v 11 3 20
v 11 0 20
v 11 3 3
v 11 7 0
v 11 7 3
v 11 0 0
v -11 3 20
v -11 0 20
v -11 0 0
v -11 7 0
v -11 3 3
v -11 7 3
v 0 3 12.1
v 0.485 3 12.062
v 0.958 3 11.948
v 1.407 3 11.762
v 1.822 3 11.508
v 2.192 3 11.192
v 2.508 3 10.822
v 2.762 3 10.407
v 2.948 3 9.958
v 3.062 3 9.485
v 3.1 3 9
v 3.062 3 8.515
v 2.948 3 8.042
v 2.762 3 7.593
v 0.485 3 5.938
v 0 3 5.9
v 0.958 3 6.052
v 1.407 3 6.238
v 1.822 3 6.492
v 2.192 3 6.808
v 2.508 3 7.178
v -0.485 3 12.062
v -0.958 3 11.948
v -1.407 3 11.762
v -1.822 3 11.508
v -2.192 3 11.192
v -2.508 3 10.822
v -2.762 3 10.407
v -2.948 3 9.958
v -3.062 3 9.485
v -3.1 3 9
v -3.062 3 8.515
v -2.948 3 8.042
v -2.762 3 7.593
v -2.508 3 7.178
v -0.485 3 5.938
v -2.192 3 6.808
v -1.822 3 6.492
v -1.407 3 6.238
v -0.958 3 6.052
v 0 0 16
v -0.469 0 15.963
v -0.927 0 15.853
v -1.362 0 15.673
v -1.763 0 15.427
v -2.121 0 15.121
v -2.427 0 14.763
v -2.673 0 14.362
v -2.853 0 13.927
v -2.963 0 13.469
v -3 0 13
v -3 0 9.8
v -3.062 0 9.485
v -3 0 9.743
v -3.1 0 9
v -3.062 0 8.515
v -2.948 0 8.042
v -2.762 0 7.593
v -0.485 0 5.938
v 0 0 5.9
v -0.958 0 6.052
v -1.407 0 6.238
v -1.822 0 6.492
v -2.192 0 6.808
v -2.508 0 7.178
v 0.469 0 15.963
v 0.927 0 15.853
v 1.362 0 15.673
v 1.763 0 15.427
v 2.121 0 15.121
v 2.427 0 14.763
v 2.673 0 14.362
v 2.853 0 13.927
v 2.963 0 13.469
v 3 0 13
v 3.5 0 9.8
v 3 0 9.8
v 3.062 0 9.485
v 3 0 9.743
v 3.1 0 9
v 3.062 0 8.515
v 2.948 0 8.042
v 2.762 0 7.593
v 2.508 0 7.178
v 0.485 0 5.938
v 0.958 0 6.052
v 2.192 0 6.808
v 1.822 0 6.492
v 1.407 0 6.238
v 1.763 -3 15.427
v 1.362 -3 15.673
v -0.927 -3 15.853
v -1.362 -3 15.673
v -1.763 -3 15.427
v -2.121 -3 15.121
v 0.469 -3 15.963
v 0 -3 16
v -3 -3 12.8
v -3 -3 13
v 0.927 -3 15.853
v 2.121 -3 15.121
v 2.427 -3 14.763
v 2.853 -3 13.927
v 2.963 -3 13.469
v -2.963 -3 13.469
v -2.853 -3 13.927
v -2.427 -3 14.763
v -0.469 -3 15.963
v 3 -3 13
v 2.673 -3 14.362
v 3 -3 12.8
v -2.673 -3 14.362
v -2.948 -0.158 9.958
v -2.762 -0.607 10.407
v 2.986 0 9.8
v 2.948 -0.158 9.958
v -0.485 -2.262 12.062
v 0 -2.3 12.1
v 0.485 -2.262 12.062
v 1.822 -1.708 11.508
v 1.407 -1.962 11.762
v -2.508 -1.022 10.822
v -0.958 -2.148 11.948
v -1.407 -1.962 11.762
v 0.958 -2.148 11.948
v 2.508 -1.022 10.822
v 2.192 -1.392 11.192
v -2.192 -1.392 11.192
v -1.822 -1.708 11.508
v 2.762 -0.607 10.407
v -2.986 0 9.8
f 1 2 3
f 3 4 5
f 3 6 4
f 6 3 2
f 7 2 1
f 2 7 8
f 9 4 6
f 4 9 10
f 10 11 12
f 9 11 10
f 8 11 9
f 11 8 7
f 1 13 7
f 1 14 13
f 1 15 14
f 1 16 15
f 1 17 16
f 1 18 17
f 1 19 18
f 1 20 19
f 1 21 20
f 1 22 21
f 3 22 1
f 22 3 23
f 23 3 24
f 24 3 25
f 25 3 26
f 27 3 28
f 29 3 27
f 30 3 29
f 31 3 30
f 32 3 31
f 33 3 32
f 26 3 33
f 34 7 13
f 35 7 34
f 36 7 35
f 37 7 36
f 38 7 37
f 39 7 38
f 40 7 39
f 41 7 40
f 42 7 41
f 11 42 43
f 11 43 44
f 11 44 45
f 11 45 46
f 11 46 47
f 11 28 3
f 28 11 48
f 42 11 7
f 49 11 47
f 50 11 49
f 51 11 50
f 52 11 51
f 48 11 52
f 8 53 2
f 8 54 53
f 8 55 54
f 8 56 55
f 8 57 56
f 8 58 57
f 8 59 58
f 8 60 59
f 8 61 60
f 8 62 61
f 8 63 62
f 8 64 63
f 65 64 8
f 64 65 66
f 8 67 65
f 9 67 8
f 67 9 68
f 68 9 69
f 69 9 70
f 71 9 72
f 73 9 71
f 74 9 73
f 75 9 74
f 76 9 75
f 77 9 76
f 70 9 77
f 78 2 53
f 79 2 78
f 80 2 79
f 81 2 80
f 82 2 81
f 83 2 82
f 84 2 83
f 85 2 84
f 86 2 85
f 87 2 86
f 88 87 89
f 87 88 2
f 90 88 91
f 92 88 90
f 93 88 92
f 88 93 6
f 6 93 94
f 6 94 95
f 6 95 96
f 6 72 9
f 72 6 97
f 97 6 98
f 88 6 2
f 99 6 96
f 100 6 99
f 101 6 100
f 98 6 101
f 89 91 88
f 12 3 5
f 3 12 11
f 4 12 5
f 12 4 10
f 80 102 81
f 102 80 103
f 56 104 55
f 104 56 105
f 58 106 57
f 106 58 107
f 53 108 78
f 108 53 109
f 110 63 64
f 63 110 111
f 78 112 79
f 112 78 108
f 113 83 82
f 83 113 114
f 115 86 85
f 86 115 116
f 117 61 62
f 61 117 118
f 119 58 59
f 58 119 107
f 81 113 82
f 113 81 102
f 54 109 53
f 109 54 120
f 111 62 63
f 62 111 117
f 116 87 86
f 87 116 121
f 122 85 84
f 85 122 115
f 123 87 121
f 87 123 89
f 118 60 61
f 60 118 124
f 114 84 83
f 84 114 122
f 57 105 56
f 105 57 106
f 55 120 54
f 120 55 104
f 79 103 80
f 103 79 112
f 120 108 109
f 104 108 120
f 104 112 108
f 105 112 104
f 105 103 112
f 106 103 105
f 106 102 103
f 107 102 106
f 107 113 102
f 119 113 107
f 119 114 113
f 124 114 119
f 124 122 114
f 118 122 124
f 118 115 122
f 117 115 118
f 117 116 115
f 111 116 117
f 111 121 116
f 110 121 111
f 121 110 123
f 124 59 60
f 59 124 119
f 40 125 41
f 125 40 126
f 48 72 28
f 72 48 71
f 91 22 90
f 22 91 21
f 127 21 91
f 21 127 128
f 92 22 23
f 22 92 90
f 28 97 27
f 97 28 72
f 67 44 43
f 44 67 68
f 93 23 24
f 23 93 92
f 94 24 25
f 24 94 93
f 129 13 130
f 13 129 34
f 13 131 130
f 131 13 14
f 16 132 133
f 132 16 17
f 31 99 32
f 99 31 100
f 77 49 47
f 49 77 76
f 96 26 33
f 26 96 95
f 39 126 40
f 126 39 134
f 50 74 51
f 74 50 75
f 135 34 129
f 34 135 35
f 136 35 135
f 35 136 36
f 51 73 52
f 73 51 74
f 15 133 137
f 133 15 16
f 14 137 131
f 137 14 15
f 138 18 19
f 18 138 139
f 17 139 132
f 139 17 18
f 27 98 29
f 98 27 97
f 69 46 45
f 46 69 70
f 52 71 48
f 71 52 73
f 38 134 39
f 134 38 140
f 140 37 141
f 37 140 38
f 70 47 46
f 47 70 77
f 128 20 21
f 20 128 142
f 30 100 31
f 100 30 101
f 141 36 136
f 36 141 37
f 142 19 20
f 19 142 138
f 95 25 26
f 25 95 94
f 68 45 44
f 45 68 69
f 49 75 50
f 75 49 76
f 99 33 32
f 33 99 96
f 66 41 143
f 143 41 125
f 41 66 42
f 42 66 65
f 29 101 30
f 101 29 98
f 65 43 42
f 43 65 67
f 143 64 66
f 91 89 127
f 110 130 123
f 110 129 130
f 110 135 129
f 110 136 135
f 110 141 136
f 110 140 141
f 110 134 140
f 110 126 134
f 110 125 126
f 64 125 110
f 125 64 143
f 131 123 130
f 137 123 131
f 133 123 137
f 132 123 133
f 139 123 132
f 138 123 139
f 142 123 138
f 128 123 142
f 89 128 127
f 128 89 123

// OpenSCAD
module washer() {
    difference() {
        union() {
            translate([0,3/2,20/2])
            cube([22,3,20],center=true);

            translate([0,7/2,3/2])
            cube([22,7,3],center=true);

            translate([0,0,6+6/2])
            rotate([90,0,0])
            hull() {
                cylinder(d=6,h=3,$fn=40);

                translate([0,10-6,0])
                cylinder(d=6,h=3,$fn=40);
            }
        }
        translate([0,0,6+6/2])
        rotate([90,0,0])
        cylinder(d=6.2,h=7,center=true,$fn=40);

        hull() {
            translate([0,0,6+6/2+0.8])
            rotate([45,0,0])
            translate([-7/2,-4,0])
            cube([7,4,5]);

            translate([-7/2,-6.01,0])
            cube([7,6,1]);
        }
    }
}

washer();
